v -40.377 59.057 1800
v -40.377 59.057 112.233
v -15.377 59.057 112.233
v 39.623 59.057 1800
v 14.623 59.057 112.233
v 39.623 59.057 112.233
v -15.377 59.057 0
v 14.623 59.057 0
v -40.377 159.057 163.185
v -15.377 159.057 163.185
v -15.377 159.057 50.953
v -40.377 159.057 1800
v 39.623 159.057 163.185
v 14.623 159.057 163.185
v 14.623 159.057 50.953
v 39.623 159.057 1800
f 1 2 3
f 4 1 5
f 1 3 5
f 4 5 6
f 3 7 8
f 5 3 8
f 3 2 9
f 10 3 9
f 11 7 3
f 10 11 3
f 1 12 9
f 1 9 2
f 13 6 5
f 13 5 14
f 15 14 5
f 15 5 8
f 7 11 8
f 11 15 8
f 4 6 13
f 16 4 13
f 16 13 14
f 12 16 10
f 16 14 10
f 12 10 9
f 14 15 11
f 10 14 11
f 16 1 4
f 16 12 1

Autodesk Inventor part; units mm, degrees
ref_plane "YZ Plane" through (0, 0, 0) normal (1, 0, 0) x (0, 1, 0)
ref_plane "XZ Plane" through (0, 0, 0) normal (0, 1, 0) x (-1, 0, 0)
ref_plane "XY Plane" through (0, 0, 0) normal (0, 0, 1) x (1, 0, 0)
sketch "Sketch1" plane through (0, 0, 0) normal (0, 0, 1) x (1, 0, 0)
  line L0 (-40.3774, 59.0566) -> (39.6226, 59.0566)
  line L1 (39.6226, 59.0566) -> (39.6226, 159.0566)
  line L2 (39.6226, 159.0566) -> (-40.3774, 159.0566)
  line L3 (-40.3774, 159.0566) -> (-40.3774, 59.0566)
  point P0 (0, 0)
  dimension "d0" = 80
  dimension "d1" = 100
extrude "Extrusion1" add sketch "Sketch1" along normal blind 1800
sketch "Sketch2" plane through (39.6226, 59.0566, 0) normal (1, 0, 0) x (0, 0, -1)
  line L0 (403.6788, -347.1669) -> (-104.7907, 650.76) projected
  line L1 (-104.7907, 650.76) -> (-128.8479, 638.5023) projected
  line L2 (379.6216, -359.4246) -> (-128.8479, 638.5023) projected
  line L3 (403.6788, -347.1669) -> (379.6216, -359.4246) projected
  line L4 (0, 0) -> (-1800, 0) projected
  line L5 (0, 0) -> (-117.0664, 229.7556)
  line L6 (-112.2326, 0) -> (-212.1687, 196.1355)
  line L7 (0, 0) -> (-112.2326, 0)
  line L8 (0, 0) -> (0, 100) projected
  line L9 (0, 100) -> (-1800, 100) projected
  line L10 (-163.1852, 100) -> (-50.9526, 100)
  point P0 (0, -59.0566)
  dimension "d4" = 100
extrude "Extrusion2" cut sketch "Sketch2" against normal blind 25 contours L4 L6 L9 L5
sketch "Sketch3" plane through (39.6226, 59.0566, 0) normal (1, 0, 0) x (0, 0, -1)
  line L0 (-50.9526, 100) -> (0, 0) projected
  line L1 (0, 0) -> (0, 100) projected
  line L2 (0, 100) -> (-50.9526, 100) projected
  point P0 (0, -59.0566)
sketch "Sketch4" plane through (39.6226, 59.0566, 0) normal (1, 0, 0) x (0, 0, -1)
  point P0 (0, -59.0566)
extrude "Extrusion3" cut sketch "Sketch3" against normal blind 100
sketch "Sketch5" plane through (-40.3774, 59.0566, 1800) normal (-1, 0, 0) x (0, 0, 1)
  line L0 (-1687.7674, 0) -> (-1636.8148, 100) projected
  line L1 (-1749.0474, 100) -> (-1800, 0) projected
  line L2 (-1800, 0) -> (0, 0) projected
  line L3 (0, 100) -> (0, 0) projected
  line L4 (-1749.0474, 100) -> (0, 100) projected
  point P0 (-1800, -59.0566)
  point P1 (-1687.7674, 0)
extrude "Extrusion4" cut sketch "Sketch5" against normal blind 25 contours L2 L1 L4 L0
properties part number "poutre100x80" material "Wood (Birch)"
